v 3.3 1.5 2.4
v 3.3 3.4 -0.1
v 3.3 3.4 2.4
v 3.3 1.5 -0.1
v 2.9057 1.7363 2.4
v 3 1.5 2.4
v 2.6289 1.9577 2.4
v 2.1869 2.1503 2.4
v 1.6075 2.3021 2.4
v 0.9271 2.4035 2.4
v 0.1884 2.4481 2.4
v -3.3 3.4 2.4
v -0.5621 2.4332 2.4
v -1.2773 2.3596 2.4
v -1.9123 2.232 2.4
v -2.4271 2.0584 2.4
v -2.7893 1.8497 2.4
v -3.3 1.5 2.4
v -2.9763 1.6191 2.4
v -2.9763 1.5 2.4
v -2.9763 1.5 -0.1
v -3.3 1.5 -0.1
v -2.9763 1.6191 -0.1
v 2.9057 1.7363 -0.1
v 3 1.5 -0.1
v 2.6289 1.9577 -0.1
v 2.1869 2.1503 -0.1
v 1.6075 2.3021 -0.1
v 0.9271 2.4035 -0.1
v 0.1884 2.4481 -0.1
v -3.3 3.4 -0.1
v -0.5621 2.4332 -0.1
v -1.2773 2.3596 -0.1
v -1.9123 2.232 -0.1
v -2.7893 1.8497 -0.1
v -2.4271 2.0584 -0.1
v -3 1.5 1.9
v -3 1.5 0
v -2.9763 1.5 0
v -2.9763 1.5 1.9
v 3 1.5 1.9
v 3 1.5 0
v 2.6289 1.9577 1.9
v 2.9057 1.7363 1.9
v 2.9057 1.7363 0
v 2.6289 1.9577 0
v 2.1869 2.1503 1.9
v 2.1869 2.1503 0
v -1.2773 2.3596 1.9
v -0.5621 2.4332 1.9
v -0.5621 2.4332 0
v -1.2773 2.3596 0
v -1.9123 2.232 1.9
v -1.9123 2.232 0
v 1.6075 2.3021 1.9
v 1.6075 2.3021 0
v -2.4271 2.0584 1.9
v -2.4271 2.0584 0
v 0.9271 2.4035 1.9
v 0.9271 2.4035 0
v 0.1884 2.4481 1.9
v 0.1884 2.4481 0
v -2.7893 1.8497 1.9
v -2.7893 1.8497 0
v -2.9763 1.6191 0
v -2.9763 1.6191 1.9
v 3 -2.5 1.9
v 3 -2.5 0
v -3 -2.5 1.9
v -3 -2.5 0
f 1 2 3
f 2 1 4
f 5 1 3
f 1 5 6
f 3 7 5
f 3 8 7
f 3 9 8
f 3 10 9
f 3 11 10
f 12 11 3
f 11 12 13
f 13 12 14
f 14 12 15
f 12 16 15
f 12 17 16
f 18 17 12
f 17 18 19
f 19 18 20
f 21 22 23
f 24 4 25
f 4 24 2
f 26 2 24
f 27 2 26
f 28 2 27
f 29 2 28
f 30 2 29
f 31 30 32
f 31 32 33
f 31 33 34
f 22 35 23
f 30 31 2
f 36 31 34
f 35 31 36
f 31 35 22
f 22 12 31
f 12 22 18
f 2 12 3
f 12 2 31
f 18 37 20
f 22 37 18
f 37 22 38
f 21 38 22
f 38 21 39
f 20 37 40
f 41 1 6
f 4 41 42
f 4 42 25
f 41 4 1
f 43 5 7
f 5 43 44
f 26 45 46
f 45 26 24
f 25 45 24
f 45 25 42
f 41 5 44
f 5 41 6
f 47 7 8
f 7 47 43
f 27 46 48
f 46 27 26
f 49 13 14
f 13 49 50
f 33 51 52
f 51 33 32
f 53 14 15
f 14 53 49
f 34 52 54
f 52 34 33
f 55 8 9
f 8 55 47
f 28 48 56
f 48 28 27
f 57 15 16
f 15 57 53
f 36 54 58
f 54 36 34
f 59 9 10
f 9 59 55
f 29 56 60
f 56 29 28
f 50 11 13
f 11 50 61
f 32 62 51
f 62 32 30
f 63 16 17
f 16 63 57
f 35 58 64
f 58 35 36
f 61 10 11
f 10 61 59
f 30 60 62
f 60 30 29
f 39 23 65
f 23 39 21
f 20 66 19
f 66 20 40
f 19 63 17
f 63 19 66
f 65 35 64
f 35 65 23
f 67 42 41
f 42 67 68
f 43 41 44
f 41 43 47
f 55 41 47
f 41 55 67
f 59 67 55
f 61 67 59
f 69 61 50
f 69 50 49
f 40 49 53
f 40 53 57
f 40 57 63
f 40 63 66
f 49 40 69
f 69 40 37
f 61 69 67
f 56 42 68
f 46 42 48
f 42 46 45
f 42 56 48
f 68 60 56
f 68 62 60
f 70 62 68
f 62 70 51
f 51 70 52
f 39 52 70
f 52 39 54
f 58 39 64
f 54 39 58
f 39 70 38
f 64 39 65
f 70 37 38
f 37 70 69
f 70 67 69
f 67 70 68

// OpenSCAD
// Generated by SolidPython 1.1.3 on 2024-07-03 19:29:36
$fn = 25;


union() {
	translate(v = [0, 1.5000000000, -0.3000000000]) {
		difference() {
			translate(v = [-3.3000000000, 0, 0.2000000000]) {
				cube(size = [6.6000000000, 1.9000000000, 2.5000000000]);
			}
			scale(v = [6.0000000000, 1.9000000000, 1]) {
				cylinder(h = 5.0000000000, r = 0.5000000000);
			}
		}
	}
	translate(v = [-3.0000000000, -2.5000000000, 0]) {
		cube(size = [6.0000000000, 5.0000000000, 1.9000000000]);
	}
}
/***********************************************
*********      SolidPython code:      **********
************************************************
 
# SolidPython example code for illuminated Salzburg Feltenreitenschule
# Brygg Ullmer, Clemson University
# Written 2024-06-24

from solid import *  # load in SolidPython/SCAD support code; solid2?
      
#dimensions in mm, mating to 144/m LED strip

elDim = {'arch': [6. , 1.9, 5.], 'dentil': [1.34, .56, 2.5], 
         'box':  [6.4, 4.7, 2.], 'column': [1.,  4.7, None]}

perBoxGeoms  = {}; boxWidth = elDim['box'][0] + elDim['column'][0]

for elName in ['column', 'dentil']: #create cubical masses for columns and dentils
  w,h,d = elDim[elName]; perBoxGeoms[elName] = cube([w,h,d])

aw, ah, ad  = elDim['arch']                # Prep to carve the arch
archCyl1    = cylinder(r=.5, h=ad)         # We'll excise this cylinder from the archCutter
archCyl2    = scale([aw, ah, 1])(archCyl1) # scaling it per elDimensions
archCutter1 = cube([aw*1.1, ah, ad*.5])        # and borrow the archs dimensions, with less depth
archCutter2 = translate([-aw*1.1/2., 0, .2])(archCutter1) #shifting it appropriately, including nudges
archCutter3 = archCutter2 - archCyl2       # now, Boolean-subtract the cylindrical void 
archCutter4 = translate([0, 1.5, -.3])(archCutter3)

archBox1    = cube([aw, ad, ah])
archBox2    = translate([-aw/2., -ad/2., 0])(archBox1)

outGeom = archCutter4 + archBox2

radialSegments = 25;     hdr = '$fn = %s;' % radialSegments # create a header for the export
scad_render_to_file(outGeom, 'frs01.scad', file_header=hdr) # write the .scad file

### end ###

 
 
************************************************/
